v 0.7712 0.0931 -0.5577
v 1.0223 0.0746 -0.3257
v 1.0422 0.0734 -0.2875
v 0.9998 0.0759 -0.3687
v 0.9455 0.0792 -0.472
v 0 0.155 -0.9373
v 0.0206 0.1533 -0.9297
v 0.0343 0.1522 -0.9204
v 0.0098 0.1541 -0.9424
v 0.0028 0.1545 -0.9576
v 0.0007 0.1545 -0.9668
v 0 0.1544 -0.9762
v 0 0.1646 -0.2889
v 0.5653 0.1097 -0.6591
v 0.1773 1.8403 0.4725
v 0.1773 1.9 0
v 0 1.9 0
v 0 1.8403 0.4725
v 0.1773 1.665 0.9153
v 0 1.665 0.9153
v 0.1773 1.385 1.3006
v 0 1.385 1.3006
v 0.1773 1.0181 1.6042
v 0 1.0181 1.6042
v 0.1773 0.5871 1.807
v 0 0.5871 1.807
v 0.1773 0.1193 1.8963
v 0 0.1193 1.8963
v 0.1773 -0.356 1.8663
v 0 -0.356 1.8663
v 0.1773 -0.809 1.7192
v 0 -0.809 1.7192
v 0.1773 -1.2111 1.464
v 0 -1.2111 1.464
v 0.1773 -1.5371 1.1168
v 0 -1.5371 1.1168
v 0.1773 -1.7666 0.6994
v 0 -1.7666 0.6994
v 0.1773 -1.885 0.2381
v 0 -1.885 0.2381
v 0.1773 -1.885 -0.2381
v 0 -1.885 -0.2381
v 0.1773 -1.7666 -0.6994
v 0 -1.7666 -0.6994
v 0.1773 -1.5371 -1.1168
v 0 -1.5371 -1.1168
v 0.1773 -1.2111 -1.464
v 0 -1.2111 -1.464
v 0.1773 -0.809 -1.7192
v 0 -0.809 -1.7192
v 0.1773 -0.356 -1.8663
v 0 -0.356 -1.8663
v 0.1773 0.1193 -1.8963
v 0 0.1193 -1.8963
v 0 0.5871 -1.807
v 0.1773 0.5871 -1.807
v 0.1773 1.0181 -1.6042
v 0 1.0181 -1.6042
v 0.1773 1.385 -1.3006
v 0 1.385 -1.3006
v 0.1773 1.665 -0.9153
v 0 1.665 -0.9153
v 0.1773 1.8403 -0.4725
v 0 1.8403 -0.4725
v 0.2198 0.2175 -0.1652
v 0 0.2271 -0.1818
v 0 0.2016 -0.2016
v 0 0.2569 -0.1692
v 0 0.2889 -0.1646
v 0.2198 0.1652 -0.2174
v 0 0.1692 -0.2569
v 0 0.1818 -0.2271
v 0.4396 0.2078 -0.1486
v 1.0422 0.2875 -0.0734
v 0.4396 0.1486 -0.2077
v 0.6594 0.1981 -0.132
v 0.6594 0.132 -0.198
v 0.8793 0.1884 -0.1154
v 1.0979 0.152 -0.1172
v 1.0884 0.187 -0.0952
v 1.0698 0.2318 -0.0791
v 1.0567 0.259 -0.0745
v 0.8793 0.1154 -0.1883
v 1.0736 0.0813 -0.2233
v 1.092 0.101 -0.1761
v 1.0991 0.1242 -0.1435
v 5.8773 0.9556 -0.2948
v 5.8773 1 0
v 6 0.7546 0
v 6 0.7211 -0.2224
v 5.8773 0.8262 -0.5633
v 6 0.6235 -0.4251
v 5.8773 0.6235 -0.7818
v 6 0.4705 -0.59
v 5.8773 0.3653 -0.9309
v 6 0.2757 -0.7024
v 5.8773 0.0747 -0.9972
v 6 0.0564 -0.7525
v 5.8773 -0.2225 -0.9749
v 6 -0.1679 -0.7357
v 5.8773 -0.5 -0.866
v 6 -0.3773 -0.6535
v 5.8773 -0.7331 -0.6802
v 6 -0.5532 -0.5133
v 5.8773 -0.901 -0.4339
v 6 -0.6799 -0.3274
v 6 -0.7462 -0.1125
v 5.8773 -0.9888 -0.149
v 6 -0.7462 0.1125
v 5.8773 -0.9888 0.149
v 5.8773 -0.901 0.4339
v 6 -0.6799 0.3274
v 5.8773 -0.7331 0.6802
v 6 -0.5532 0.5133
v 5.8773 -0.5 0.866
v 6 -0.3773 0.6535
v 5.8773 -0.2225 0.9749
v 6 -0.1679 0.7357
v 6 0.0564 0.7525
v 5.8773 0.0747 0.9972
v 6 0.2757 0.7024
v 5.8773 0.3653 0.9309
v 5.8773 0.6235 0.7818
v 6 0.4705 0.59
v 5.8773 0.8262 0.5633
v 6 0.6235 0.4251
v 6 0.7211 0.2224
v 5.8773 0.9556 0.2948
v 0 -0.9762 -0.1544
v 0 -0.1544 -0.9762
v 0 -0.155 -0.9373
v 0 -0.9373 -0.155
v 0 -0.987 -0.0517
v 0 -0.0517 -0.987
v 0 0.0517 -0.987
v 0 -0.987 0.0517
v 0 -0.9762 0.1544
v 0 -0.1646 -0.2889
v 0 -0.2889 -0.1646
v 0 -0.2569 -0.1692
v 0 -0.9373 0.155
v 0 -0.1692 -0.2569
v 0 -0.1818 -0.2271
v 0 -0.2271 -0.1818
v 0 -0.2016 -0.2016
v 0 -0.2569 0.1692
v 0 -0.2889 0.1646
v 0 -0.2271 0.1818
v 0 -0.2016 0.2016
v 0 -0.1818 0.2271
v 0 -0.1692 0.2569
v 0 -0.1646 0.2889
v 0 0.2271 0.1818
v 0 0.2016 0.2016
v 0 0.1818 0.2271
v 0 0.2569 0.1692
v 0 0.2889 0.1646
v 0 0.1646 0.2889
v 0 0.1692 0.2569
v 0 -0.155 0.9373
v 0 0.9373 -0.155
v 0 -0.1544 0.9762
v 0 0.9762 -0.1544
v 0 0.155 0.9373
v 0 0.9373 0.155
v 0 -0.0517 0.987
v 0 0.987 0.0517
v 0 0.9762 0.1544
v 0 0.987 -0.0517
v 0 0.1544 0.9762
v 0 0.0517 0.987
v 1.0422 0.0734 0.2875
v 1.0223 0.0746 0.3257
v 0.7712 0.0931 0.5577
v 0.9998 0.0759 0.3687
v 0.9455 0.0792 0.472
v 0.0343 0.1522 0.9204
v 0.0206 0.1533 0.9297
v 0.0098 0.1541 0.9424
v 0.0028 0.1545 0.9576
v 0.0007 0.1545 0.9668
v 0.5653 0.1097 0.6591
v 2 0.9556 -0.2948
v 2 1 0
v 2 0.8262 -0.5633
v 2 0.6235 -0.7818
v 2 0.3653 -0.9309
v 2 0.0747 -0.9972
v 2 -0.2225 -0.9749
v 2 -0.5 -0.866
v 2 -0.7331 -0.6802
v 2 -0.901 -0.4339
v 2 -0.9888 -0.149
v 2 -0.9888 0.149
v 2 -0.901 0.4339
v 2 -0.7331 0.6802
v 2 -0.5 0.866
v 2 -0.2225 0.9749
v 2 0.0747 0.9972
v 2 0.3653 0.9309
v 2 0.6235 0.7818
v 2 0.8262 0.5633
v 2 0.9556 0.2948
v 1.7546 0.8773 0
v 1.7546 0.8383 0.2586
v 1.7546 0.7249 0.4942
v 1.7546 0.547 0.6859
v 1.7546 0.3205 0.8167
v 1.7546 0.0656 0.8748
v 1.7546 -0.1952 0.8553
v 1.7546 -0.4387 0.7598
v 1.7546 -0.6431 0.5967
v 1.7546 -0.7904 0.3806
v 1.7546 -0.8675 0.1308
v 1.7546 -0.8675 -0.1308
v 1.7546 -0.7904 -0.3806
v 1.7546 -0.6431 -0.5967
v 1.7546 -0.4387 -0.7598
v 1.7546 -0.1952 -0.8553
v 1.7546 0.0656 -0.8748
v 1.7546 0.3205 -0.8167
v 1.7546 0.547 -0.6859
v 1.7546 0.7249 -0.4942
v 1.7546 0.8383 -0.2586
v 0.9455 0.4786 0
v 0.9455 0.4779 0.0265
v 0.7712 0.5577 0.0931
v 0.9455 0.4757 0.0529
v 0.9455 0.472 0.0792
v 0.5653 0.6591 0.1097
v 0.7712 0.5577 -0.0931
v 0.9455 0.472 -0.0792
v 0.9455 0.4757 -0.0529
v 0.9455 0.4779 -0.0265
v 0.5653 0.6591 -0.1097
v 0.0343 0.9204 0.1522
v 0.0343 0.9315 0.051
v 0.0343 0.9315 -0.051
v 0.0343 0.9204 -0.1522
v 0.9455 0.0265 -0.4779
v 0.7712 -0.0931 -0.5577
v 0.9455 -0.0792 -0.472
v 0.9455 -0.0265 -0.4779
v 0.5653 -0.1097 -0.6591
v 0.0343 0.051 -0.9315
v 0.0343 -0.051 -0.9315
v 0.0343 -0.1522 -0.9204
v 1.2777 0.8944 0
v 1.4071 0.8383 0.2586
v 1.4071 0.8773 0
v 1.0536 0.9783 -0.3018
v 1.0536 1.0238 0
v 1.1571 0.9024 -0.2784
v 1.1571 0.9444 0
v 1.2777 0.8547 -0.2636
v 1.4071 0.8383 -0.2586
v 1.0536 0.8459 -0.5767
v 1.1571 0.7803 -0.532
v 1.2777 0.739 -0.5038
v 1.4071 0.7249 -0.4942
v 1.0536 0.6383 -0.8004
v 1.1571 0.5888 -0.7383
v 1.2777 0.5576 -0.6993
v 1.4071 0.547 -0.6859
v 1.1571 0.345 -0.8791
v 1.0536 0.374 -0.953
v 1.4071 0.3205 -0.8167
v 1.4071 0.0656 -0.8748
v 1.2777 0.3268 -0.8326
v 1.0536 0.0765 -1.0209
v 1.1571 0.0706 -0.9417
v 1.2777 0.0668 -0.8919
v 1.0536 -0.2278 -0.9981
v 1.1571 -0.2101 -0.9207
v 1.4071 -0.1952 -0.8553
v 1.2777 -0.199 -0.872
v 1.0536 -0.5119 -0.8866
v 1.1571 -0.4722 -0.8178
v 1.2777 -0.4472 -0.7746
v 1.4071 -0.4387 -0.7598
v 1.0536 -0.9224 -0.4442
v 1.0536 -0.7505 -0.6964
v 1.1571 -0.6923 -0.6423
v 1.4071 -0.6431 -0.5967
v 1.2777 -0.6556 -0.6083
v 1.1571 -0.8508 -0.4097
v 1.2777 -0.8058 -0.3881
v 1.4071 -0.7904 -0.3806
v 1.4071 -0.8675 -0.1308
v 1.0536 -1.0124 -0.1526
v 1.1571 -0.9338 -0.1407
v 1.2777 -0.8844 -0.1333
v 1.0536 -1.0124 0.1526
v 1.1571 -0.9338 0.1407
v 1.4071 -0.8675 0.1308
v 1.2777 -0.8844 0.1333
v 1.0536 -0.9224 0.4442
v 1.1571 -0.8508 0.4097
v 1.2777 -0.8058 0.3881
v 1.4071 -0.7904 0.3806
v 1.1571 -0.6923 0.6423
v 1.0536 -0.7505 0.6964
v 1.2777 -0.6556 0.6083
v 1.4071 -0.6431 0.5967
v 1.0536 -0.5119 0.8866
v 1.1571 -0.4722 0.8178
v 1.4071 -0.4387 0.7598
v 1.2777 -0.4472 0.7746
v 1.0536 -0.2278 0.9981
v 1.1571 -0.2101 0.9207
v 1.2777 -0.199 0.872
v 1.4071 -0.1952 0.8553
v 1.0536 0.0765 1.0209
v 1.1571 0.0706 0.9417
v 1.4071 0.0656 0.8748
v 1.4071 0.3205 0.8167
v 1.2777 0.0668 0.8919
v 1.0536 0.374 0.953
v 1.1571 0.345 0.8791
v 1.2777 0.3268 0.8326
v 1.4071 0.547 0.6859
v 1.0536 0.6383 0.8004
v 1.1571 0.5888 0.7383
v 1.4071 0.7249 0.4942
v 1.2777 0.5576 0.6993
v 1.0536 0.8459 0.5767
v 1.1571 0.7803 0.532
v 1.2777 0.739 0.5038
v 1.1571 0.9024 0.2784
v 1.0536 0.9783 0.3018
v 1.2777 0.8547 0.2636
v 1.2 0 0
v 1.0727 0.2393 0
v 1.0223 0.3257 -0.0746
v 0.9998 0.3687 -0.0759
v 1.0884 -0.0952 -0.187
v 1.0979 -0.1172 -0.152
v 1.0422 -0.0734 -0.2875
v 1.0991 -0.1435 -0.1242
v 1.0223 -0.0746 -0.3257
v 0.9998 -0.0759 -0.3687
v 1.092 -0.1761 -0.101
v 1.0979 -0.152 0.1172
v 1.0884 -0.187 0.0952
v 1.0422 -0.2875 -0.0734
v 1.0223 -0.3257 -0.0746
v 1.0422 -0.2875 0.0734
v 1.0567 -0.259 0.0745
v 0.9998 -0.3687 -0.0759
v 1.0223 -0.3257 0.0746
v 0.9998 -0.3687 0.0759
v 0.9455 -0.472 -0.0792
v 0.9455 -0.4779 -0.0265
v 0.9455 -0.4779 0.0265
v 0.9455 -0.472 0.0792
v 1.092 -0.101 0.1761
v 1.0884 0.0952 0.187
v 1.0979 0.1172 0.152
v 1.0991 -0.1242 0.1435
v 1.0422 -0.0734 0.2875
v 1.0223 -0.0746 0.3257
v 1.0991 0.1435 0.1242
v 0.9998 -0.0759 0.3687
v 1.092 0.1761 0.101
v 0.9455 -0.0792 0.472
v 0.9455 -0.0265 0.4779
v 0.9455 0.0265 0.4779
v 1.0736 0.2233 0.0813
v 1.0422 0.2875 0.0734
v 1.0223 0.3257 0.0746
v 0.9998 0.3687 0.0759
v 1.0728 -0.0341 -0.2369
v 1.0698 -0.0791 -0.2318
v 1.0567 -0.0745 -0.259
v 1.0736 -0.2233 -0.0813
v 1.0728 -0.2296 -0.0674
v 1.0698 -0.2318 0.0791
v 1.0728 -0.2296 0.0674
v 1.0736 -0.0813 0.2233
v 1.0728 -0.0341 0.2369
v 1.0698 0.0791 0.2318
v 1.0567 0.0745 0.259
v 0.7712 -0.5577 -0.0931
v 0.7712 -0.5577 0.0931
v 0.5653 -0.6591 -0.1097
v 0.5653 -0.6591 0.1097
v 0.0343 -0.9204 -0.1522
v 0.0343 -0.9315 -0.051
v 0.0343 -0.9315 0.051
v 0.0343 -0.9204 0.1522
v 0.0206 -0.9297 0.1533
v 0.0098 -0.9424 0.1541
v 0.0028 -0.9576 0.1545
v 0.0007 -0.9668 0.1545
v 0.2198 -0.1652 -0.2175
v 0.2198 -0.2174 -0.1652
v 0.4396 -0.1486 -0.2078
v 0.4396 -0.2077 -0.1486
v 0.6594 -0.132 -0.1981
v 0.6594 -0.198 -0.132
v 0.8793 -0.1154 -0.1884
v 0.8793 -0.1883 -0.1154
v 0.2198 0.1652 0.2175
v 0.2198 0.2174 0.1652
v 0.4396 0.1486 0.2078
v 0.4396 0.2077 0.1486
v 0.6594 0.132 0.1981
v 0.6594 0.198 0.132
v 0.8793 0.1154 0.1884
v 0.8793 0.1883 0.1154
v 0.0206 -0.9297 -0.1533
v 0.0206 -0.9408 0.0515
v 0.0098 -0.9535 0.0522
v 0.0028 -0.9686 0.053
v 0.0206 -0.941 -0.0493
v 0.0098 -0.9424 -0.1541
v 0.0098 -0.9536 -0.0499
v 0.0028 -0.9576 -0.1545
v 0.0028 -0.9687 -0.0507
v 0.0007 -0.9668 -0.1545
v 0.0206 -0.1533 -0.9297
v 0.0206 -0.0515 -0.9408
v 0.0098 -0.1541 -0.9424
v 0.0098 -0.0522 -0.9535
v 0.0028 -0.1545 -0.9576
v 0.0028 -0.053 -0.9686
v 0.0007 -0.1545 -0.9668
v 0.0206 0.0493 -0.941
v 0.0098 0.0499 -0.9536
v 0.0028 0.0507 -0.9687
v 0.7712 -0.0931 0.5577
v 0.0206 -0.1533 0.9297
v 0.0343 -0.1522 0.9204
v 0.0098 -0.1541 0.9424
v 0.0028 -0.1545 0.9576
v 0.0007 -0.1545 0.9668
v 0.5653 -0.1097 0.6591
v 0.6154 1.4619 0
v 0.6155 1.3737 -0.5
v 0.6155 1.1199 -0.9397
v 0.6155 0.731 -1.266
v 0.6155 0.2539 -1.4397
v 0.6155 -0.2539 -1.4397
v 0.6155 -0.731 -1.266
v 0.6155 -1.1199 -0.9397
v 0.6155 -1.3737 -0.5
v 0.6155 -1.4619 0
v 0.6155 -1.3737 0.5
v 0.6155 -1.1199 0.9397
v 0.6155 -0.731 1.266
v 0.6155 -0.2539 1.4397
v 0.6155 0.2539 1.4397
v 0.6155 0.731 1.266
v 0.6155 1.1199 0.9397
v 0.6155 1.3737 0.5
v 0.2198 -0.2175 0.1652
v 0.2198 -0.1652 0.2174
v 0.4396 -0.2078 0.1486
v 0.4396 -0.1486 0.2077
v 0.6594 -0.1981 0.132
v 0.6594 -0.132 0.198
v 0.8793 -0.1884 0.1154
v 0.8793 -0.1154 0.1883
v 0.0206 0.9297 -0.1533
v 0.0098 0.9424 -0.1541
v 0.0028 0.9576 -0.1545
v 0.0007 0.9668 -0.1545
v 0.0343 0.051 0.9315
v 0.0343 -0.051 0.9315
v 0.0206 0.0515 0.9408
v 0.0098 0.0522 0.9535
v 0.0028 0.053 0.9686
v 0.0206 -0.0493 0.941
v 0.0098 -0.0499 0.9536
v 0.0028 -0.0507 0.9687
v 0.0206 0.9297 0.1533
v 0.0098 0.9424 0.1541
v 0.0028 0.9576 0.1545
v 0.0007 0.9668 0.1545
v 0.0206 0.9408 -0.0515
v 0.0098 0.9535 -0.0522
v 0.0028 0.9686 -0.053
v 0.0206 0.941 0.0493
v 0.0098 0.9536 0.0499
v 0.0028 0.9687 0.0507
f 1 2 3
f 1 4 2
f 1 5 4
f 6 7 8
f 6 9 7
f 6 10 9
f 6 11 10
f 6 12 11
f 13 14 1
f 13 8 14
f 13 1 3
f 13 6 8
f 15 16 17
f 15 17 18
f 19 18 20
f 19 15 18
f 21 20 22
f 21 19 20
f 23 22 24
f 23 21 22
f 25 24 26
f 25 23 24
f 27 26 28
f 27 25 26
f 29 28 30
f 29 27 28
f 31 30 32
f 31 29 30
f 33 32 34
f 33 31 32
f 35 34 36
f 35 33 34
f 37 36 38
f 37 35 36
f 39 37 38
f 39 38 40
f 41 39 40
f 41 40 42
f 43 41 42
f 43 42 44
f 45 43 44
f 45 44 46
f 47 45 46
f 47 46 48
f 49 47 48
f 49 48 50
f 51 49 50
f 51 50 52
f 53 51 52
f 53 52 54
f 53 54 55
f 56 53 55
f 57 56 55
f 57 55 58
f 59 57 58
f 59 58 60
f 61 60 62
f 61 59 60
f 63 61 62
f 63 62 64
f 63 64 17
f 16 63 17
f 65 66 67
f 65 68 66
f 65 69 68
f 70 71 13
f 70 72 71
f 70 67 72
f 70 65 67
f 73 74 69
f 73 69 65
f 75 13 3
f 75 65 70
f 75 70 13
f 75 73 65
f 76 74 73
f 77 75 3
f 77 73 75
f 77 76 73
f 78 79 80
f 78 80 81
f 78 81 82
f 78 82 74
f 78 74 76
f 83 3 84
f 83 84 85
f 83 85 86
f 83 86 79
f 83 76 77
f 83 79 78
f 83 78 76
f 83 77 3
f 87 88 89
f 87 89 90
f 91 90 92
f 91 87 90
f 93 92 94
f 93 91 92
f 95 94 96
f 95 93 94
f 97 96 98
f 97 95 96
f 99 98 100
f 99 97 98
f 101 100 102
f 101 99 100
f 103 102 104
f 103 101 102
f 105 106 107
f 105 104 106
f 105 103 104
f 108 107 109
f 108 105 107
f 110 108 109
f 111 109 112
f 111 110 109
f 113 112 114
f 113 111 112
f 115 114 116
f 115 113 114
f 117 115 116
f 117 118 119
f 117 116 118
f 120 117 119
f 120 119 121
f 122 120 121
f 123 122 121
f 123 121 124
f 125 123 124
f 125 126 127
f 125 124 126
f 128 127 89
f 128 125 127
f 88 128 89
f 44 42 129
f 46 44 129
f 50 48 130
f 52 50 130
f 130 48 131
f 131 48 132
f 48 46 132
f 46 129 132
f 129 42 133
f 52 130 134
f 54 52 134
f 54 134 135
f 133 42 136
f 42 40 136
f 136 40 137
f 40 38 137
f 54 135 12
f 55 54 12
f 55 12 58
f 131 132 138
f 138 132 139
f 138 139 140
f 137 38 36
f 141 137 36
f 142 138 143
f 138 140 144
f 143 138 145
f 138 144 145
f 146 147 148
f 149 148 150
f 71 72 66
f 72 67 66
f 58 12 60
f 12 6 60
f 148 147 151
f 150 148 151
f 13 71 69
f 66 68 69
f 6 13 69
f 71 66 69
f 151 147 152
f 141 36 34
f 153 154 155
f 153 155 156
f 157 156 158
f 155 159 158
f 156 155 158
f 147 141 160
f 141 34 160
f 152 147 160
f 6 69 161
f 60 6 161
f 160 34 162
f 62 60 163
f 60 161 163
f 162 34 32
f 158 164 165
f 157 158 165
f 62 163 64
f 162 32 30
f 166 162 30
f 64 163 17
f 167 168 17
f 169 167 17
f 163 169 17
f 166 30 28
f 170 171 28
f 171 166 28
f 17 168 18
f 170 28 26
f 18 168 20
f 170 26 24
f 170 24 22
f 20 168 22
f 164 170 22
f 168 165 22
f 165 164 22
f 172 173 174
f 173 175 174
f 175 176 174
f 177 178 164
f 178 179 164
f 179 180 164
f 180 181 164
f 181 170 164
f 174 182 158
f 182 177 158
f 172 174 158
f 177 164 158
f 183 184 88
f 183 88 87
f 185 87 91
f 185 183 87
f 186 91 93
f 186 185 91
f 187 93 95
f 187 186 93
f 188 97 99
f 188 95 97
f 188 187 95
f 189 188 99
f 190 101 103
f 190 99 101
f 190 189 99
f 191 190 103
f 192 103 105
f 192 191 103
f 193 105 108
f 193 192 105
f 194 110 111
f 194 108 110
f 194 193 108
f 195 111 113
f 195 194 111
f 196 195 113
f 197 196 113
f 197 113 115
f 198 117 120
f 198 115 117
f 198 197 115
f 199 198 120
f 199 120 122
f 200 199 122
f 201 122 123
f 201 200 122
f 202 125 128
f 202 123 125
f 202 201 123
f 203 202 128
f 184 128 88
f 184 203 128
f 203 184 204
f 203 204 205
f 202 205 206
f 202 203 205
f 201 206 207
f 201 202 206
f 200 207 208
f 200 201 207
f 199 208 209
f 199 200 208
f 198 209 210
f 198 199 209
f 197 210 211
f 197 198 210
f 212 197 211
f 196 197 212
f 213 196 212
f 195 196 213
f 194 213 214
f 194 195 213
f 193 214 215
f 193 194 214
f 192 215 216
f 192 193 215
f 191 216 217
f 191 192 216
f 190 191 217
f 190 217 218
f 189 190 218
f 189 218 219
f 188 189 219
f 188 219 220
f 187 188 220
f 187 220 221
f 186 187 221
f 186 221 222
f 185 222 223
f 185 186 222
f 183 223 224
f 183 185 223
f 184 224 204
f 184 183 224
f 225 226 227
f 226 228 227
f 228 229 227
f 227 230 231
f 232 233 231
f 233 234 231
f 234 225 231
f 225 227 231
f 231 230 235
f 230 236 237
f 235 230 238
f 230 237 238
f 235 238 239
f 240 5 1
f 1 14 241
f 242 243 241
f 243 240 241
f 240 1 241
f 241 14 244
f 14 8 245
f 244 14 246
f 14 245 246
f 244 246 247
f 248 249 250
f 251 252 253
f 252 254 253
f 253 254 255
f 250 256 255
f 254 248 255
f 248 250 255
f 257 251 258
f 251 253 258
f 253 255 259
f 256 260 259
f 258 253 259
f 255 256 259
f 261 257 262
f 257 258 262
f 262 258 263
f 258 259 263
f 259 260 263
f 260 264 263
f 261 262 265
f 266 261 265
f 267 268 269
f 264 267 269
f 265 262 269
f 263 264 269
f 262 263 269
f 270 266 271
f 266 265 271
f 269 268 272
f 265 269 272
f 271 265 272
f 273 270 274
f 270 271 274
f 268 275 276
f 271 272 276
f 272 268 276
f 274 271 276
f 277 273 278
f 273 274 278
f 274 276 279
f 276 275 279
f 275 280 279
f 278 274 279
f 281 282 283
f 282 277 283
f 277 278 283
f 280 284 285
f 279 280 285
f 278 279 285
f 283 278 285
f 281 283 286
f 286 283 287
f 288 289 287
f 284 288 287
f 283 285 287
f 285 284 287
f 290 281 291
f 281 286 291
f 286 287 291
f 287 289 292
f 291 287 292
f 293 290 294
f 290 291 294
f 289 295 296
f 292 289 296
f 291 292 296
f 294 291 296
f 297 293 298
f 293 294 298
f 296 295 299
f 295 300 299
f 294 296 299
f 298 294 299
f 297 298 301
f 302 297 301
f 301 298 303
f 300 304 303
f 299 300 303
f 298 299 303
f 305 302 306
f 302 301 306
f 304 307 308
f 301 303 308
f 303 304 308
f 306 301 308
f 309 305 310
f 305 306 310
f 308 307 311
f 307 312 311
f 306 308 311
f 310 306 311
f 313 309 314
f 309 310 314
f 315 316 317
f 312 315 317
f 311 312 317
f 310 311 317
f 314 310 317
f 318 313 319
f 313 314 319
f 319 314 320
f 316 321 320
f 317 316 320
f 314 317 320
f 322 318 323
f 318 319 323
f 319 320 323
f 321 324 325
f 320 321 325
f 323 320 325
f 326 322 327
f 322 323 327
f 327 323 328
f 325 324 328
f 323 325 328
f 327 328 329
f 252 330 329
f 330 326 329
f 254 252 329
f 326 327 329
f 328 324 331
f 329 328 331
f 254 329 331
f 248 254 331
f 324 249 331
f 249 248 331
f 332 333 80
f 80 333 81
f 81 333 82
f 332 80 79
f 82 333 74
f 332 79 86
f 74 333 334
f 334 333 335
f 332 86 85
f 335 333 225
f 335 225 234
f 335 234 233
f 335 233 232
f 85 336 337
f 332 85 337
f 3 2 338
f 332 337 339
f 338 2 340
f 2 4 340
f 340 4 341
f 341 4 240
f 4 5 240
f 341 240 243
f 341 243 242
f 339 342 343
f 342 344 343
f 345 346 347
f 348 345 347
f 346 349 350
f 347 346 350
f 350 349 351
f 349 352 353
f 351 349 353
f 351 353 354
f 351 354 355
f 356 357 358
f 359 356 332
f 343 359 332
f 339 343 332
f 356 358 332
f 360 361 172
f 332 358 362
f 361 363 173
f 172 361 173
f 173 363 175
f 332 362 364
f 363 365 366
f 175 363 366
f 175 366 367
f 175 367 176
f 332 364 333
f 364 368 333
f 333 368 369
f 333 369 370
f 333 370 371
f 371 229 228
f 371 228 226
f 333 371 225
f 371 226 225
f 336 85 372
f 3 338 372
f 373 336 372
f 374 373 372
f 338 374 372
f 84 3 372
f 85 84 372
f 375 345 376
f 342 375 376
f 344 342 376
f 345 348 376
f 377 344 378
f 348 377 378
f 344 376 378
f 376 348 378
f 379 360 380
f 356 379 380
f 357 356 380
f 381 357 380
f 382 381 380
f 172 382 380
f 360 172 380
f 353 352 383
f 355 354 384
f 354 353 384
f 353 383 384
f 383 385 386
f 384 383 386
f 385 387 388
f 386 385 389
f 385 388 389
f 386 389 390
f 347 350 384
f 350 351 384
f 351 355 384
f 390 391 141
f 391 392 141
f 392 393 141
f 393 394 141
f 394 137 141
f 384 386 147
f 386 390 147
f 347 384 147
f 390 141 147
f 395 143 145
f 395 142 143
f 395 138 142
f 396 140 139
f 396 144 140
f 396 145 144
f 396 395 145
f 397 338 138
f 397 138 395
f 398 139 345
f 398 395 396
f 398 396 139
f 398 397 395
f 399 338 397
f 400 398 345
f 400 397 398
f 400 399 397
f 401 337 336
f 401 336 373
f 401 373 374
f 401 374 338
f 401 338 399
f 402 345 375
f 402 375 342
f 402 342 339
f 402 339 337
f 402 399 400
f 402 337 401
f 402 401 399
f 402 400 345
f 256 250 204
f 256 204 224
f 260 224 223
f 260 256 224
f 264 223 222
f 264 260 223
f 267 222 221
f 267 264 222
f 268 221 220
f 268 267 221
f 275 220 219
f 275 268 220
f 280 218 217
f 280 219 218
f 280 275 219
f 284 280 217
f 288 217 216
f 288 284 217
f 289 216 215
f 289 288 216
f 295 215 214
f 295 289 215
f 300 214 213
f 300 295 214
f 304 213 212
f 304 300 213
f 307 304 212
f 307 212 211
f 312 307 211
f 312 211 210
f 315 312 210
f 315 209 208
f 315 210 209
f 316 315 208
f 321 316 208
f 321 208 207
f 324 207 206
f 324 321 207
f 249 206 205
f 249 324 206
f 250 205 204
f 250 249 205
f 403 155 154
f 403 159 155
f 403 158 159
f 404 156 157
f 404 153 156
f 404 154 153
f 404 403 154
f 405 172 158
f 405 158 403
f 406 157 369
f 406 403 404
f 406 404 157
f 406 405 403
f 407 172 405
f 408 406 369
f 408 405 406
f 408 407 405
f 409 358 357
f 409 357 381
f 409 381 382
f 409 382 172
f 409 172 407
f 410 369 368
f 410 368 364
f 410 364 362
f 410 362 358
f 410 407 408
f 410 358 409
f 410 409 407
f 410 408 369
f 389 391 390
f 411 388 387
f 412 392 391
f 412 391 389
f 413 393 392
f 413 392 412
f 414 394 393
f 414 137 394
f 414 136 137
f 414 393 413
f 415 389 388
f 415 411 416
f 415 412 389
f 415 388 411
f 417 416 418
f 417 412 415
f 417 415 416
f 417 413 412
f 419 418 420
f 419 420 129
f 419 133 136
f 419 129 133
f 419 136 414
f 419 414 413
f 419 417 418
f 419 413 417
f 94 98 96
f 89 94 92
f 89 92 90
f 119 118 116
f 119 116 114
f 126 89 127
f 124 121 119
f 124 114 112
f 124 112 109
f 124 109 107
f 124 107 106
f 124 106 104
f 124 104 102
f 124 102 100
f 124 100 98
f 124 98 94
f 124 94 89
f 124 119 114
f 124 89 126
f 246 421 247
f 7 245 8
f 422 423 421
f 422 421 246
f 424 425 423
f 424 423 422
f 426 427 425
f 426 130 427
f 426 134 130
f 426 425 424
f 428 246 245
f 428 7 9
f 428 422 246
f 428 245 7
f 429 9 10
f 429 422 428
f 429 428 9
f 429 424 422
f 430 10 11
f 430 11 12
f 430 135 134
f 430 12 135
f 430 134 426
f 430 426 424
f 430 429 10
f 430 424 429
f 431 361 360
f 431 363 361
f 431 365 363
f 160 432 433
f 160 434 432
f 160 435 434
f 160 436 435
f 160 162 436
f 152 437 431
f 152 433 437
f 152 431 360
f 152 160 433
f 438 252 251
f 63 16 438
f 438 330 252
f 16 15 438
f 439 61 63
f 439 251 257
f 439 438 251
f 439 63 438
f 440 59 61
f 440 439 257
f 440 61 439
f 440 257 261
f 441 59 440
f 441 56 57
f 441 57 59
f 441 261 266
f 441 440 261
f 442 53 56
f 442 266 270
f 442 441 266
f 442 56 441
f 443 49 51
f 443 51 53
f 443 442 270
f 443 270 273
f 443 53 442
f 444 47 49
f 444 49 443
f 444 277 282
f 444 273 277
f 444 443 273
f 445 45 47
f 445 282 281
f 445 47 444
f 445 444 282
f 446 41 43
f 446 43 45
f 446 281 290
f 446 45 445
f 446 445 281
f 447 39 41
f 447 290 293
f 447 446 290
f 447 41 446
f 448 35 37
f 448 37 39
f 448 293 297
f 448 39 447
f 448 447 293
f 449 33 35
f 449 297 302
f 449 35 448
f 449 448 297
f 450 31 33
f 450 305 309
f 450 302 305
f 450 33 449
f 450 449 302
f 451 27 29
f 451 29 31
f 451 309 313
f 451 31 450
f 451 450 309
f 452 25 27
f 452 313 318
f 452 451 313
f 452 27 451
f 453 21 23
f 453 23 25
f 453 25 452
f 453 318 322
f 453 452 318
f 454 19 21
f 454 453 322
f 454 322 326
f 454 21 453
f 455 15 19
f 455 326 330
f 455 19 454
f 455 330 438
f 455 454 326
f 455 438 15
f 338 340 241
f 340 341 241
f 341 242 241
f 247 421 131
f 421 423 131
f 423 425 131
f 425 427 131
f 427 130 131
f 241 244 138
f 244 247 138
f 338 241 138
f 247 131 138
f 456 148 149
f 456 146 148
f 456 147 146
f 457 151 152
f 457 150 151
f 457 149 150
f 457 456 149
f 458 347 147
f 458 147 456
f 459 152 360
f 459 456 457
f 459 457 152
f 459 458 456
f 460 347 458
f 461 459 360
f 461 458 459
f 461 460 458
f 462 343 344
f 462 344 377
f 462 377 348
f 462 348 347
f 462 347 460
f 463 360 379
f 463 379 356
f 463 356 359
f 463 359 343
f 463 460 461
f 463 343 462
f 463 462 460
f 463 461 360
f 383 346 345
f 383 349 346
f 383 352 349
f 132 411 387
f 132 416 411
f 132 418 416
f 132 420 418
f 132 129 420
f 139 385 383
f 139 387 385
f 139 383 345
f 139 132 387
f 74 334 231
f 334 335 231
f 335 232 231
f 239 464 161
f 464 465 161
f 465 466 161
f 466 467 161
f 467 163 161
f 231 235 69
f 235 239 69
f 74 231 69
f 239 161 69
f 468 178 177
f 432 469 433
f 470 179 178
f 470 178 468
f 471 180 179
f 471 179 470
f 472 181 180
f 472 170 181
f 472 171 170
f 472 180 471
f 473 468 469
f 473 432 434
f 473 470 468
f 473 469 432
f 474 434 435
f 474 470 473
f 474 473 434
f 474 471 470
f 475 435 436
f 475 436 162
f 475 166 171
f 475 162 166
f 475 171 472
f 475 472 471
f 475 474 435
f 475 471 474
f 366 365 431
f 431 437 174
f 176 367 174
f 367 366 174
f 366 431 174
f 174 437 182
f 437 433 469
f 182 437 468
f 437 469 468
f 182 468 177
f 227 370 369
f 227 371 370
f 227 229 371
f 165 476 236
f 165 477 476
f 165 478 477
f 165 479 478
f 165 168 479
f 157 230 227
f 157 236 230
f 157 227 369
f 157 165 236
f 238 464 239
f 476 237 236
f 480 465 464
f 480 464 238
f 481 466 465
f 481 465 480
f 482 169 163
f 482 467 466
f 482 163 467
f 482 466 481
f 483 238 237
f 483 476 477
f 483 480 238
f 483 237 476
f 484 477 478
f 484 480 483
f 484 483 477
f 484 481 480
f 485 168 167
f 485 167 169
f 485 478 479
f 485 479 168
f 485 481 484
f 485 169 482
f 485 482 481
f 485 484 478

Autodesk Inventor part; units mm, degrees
ref_plane "YZ Plane" through (0, 0, 0) normal (1, 0, 0) x (0, 1, 0)
ref_plane "XZ Plane" through (0, 0, 0) normal (0, 1, 0) x (-1, 0, 0)
sketch "Sketch1" plane through (0, 0, 0) normal (0, 0, 1) x (1, 0, 0)
  line L0 (1.2, 0) -> (6, 0)
  line L1 (6, 0) -> (6, 1)
  line L2 (6, 1) -> (2, 1)
  line L3 (2, 1) -> (1.7546, 0.8773)
  line L4 (1.7546, 0.8773) -> (1.4071, 0.8773)
  line L5 (0, 1.9) -> (0, 0.95)
  line L6 (0, 0.95) -> (0.9455, 0.4786)
  line L7 (0.9455, 0.4786) -> (1.2, 0)
  line L8 (-1.2, 0) -> (7.2, 0) projected
  line L9 (0, -0.38) -> (0, 2.28) projected
  line L10 (0, 1.9) -> (0.1773, 1.9)
  line L11 (0.1773, 1.9) -> (1.0536, 1.0238)
  line L12 (2, 1) -> (1.0773, 1) construction
  arc A0 (1.0536, 1.0238) -> (1.4071, 0.8773) centre (1.4071, 1.3773) ccw
  point P0 (1.2, 0.8773)
  dimension "d1" = 4
  dimension "d2" = 2
  dimension "d3" = 1.7546
  dimension "d4" = 1.9
  dimension "d5" = 26.5
  dimension "d6" = 62
  dimension "d7" = 1.2
  dimension "d8" = 0.2454
  dimension "d12" = 3.8
  dimension "d13" = 45
  dimension "d15" = 6
  dimension "d24" = 1.2
  dimension "d93" = 0.5
revolve "Body" add sketch "Sketch1" angle 360 about axis through (1.2, 0, 0) along (1, 0, 0) contours L7 L6 L5 L10 L11 A0 L4 L3 L2 L1 L0
sketch "Sketch2" plane through (0, 0, 0) normal (-1, 0, 0) x (0, 0, 1)
  line L0 (0, 0.95) -> (0, 0) construction
  line L1 (0, 0) -> (0.95, 0) construction
  arc A0 (0.285, 0) -> (0, 0.285) centre (0, 0) ccw construction
  arc A1 (0.3325, 0) -> (0, 0.3325) centre (0, 0) ccw construction
  arc A2 (0.9373, 0.155) -> (0.155, 0.9373) centre (0, 0) ccw
  line L2 (0, 0) -> (0.6718, 0.6718) construction
  line L3 (0.155, 0.9373) -> (0.1646, 0.2889)
  line L4 (0.9373, 0.155) -> (0.2889, 0.1646)
  arc A3 (0.155, 0.9373) -> (0, 0.95) centre (0, 0) ccw
  arc A4 (0.95, 0) -> (0.9373, 0.155) centre (0, 0) ccw
  line L5 (0, -2.66) -> (0, 2.66) projected
  line L6 (-2.66, 0) -> (2.66, 0) projected
  arc A5 (0.155, -0.9373) -> (0.9373, -0.155) centre (0, 0) ccw
  line L7 (0.155, -0.9373) -> (0.1646, -0.2889)
  line L8 (0.9373, -0.155) -> (0.2889, -0.1646)
  arc A6 (0, -0.95) -> (0.155, -0.9373) centre (0, 0) ccw
  arc A7 (0.9373, -0.155) -> (0.95, 0) centre (0, 0) ccw
  arc A8 (-0.155, 0.9373) -> (-0.9373, 0.155) centre (0, 0) ccw
  line L9 (-0.155, 0.9373) -> (-0.1646, 0.2889)
  line L10 (-0.9373, 0.155) -> (-0.2889, 0.1646)
  arc A9 (0, 0.95) -> (-0.155, 0.9373) centre (0, 0) ccw
  arc A10 (-0.9373, 0.155) -> (-0.95, 0) centre (0, 0) ccw
  arc A11 (-0.155, -0.9373) -> (0, -0.95) centre (0, 0) ccw
  arc A12 (-0.9373, -0.155) -> (-0.155, -0.9373) centre (0, 0) ccw
  arc A13 (-0.95, 0) -> (-0.9373, -0.155) centre (0, 0) ccw
  line L11 (-0.9373, -0.155) -> (-0.2889, -0.1646)
  line L12 (-0.155, -0.9373) -> (-0.1646, -0.2889)
  arc A14 (0.1646, 0.2889) -> (0.2889, 0.1646) centre (0.2908, 0.2908) ccw
  arc A15 (0.2889, -0.1646) -> (0.1646, -0.2889) centre (0.2908, -0.2908) ccw
  arc A16 (-0.2889, 0.1646) -> (-0.1646, 0.2889) centre (-0.2908, 0.2908) ccw
  arc A17 (-0.1646, -0.2889) -> (-0.2889, -0.1646) centre (-0.2908, -0.2908) ccw
  point P0 (0.6718, -0.6718)
  point P1 (-0.6718, 0.6718)
  point P2 (-0.6718, -0.6718)
  dimension "d17" = 0.57
  dimension "d18" = 0.665
  dimension "d19" = 1.9
  dimension "d20" = 45
  dimension "d21" = 0.155
extrude "Slot" add sketch "Sketch2" against normal up to next draft 5 contours L4 A14 L3 A2 | A5 L7 A15 L8 | L9 A16 L10 A8 | A12 L11 A17 L12
fillet "Fillet1" radius 0.062 4 edges at (0, 0.95, 0) (0, 0, -0.95) (0, -0.95, 0) (0, 0, 0.95)
thread "Thread" size "M2x0.4" class "6g" standard "ISO Metric profile" length 4
chamfer "Chamfer1" distance 0.2454 distance2 0.1227 1 edges at (6, -1, 0) measured on face at (6, 0.3275, -0.4215)
ref_plane "Work Plane2" through (3.35, 0, 0) normal (0, 0, -1) x (1, 0, 0)
equation "\"d1\" = GEL"
equation "\"d2\" = GD"
equation "\"d3\" = BDM"
equation "\"d4\" = SDM"
equation "\"d7\" = INTI"
equation "\"d8\" = GAL"
equation "\"d12\" = KOD"
equation "\"d13\" = 0.5 * SEWI"
equation "\"d15\" = NLG"
equation "\"d24\" = KOH"
equation "\"d93\" = R"
equation "\"d17\" = 0.3 * SDM"
equation "\"d18\" = 0.35 * SDM"
equation "\"d19\" = SDM"
equation "\"d21\" = 0.5 * SBR"
equation "\"d23\" = 0.2 * SBR"
equation "\"d10\" = GEL"
equation "\"d25\" = -0.5 * SPD + 0.5 * GD"
equation "\"d26\" = 0.5 * GAL"
equation "\"NLG\" = 6"
equation "\"GEL\" = 4"
equation "\"GAL\" = 0.61345 * PTC"
equation "\"SPD\" = NND - 1.2269 * PTC"
equation "\"KOD\" = 3.8"
equation "\"KOH\" = 1.2"
equation "\"SBR\" = 0.31"
equation "\"INTI\" = 1.2"
equation "\"SDM\" = 1.9"
equation "\"GD\" = NND"
equation "\"BDM\" = NND - GAL"
equation "\"SEWI\" = 90deg"
equation "\"d9\" = SDM"
equation "\"R\" = 0.5"
equation "\"GUL\" = 0.61345 * PTC"
equation "\"TOA\" = 30deg"
equation "\"EPV\" = 2.2"
equation "\"THREADDIA\" = 2"
equation "\"PTC\" = 0.4"
equation "\"NND\" = 2"
equation "\"GD1\" = THREADDIA - 1.2269 * PTC"
properties part number "ISO 7046-1  - M2 x 6 - 4.8 - H" material "Steel"
